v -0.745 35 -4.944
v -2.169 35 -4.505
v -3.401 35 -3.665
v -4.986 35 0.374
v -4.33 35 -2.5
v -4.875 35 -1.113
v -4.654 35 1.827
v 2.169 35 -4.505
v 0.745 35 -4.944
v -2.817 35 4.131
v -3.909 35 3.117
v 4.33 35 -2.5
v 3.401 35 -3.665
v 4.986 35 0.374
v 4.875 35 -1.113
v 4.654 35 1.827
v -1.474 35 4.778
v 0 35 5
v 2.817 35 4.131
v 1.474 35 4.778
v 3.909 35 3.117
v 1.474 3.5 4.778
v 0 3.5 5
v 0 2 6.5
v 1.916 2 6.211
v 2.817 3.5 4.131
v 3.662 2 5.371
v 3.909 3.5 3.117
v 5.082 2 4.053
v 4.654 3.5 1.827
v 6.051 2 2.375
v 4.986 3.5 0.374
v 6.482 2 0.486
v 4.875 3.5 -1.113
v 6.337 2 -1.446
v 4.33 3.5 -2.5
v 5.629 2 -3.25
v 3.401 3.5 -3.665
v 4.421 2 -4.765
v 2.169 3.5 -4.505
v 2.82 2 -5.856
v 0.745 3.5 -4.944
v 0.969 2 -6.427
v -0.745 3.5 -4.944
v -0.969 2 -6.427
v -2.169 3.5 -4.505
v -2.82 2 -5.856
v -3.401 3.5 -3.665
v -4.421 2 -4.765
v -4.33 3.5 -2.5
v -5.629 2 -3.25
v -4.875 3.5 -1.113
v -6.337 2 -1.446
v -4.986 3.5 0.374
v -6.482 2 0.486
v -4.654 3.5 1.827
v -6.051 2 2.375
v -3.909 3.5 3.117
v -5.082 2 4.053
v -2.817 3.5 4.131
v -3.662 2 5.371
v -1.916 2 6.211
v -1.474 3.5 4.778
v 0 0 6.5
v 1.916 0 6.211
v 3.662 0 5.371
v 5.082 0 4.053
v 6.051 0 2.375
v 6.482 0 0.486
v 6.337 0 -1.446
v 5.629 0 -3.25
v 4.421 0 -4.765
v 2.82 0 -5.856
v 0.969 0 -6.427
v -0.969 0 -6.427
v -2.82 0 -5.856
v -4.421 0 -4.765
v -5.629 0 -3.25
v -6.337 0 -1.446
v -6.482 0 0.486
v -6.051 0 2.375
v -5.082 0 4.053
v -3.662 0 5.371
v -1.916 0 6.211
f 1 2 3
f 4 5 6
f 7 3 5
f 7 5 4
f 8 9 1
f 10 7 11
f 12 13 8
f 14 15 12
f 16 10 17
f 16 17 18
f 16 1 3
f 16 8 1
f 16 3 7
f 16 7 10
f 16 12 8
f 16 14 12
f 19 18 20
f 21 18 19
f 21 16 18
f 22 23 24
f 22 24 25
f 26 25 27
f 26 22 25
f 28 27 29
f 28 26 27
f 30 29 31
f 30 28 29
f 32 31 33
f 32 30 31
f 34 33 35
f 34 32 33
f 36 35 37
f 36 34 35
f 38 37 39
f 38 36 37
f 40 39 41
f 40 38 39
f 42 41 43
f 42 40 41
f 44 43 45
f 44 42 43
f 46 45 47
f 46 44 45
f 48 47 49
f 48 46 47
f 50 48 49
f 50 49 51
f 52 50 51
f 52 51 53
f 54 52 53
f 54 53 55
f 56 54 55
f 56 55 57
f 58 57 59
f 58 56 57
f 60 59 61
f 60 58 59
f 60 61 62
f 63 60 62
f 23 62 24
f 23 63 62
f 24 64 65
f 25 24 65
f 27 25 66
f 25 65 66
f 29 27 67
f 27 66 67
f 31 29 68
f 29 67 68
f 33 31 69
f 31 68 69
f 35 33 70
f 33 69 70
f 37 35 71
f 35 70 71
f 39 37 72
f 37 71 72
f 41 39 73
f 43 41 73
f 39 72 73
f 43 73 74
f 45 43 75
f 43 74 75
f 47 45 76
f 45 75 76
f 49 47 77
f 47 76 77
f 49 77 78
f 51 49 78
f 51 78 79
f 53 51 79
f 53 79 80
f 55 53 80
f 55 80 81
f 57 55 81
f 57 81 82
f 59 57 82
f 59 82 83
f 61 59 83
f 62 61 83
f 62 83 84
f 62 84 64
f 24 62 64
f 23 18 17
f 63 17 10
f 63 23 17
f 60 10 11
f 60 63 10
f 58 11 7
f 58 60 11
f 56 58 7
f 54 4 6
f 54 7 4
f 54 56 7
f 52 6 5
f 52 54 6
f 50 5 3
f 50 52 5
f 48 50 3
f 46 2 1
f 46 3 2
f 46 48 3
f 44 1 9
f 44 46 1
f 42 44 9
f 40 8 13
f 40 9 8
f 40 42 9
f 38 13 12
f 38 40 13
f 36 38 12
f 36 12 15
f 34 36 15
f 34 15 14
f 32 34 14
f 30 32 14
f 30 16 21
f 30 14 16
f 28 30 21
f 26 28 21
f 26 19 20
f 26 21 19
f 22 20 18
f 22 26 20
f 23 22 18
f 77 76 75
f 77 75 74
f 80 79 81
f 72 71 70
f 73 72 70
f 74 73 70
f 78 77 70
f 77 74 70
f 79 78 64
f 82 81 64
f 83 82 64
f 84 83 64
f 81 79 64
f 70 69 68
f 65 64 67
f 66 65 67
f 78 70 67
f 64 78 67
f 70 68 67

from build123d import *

# Parameters (mm, degrees)
SKETCH_1_R          = 6.5
EXTRUDE_1_DEPTH     = 35
CUT_EXTRUDE_START   = -30
SKETCH_2_R          = 6.5
SKETCH_2_R_2        = 5
CUT_EXTRUDE_1_DEPTH = 30
CHAMFER_1_SIZE      = 3


with BuildPart() as part:
    # Эскиз1 → Бобышка-Вытянуть1 (new body)
    with BuildSketch(Plane(origin=(0, 0, 0), x_dir=(1, 0, 0), z_dir=(0, 1, 0))):
        with Locations(Location((0, 0, 0), (0, 0, 270))):
            Circle(SKETCH_1_R)
    extrude(amount=EXTRUDE_1_DEPTH)

    # Эскиз2 → Вырез-Вытянуть1 (cut)
    with BuildSketch(Plane(origin=(0, 35, 0), x_dir=(1, 0, 0), z_dir=(0, 1, 0)).offset(CUT_EXTRUDE_START)):
        with Locations(Location((0, 0, 0), (0, 0, 270))):
            Circle(SKETCH_2_R)
        with Locations(Location((0, 0, 0), (0, 0, 270))):
            Circle(SKETCH_2_R_2, mode=Mode.SUBTRACT)
    extrude(amount=CUT_EXTRUDE_1_DEPTH, mode=Mode.SUBTRACT)

    # Фаска1
    # the kernel refuses this chamfer: 3 mm, written as the material it takes off along each edge
    with BuildSketch(Plane(origin=(0, 5, 0), x_dir=(0, 0, 1), z_dir=(-1, 0, 0))) as chamfer_1_piece_1_section:
        Polygon((6.5, -CHAMFER_1_SIZE), (6.5 - CHAMFER_1_SIZE, 0), (6.5, 0), align=None)
    chamfer_1_piece_1 = revolve(axis=Axis((0, 5, 0), (0, 1, 0)), mode=Mode.PRIVATE)
    chamfer_1_piece_1 = chamfer_1_piece_1 - Plane(origin=(0, 2.743926997, 0), x_dir=(0, 0, 1), z_dir=(0, -1, 0)) * Cylinder(5, 27, mode=Mode.PRIVATE)
    add(chamfer_1_piece_1, mode=Mode.SUBTRACT)


solid = part.part
